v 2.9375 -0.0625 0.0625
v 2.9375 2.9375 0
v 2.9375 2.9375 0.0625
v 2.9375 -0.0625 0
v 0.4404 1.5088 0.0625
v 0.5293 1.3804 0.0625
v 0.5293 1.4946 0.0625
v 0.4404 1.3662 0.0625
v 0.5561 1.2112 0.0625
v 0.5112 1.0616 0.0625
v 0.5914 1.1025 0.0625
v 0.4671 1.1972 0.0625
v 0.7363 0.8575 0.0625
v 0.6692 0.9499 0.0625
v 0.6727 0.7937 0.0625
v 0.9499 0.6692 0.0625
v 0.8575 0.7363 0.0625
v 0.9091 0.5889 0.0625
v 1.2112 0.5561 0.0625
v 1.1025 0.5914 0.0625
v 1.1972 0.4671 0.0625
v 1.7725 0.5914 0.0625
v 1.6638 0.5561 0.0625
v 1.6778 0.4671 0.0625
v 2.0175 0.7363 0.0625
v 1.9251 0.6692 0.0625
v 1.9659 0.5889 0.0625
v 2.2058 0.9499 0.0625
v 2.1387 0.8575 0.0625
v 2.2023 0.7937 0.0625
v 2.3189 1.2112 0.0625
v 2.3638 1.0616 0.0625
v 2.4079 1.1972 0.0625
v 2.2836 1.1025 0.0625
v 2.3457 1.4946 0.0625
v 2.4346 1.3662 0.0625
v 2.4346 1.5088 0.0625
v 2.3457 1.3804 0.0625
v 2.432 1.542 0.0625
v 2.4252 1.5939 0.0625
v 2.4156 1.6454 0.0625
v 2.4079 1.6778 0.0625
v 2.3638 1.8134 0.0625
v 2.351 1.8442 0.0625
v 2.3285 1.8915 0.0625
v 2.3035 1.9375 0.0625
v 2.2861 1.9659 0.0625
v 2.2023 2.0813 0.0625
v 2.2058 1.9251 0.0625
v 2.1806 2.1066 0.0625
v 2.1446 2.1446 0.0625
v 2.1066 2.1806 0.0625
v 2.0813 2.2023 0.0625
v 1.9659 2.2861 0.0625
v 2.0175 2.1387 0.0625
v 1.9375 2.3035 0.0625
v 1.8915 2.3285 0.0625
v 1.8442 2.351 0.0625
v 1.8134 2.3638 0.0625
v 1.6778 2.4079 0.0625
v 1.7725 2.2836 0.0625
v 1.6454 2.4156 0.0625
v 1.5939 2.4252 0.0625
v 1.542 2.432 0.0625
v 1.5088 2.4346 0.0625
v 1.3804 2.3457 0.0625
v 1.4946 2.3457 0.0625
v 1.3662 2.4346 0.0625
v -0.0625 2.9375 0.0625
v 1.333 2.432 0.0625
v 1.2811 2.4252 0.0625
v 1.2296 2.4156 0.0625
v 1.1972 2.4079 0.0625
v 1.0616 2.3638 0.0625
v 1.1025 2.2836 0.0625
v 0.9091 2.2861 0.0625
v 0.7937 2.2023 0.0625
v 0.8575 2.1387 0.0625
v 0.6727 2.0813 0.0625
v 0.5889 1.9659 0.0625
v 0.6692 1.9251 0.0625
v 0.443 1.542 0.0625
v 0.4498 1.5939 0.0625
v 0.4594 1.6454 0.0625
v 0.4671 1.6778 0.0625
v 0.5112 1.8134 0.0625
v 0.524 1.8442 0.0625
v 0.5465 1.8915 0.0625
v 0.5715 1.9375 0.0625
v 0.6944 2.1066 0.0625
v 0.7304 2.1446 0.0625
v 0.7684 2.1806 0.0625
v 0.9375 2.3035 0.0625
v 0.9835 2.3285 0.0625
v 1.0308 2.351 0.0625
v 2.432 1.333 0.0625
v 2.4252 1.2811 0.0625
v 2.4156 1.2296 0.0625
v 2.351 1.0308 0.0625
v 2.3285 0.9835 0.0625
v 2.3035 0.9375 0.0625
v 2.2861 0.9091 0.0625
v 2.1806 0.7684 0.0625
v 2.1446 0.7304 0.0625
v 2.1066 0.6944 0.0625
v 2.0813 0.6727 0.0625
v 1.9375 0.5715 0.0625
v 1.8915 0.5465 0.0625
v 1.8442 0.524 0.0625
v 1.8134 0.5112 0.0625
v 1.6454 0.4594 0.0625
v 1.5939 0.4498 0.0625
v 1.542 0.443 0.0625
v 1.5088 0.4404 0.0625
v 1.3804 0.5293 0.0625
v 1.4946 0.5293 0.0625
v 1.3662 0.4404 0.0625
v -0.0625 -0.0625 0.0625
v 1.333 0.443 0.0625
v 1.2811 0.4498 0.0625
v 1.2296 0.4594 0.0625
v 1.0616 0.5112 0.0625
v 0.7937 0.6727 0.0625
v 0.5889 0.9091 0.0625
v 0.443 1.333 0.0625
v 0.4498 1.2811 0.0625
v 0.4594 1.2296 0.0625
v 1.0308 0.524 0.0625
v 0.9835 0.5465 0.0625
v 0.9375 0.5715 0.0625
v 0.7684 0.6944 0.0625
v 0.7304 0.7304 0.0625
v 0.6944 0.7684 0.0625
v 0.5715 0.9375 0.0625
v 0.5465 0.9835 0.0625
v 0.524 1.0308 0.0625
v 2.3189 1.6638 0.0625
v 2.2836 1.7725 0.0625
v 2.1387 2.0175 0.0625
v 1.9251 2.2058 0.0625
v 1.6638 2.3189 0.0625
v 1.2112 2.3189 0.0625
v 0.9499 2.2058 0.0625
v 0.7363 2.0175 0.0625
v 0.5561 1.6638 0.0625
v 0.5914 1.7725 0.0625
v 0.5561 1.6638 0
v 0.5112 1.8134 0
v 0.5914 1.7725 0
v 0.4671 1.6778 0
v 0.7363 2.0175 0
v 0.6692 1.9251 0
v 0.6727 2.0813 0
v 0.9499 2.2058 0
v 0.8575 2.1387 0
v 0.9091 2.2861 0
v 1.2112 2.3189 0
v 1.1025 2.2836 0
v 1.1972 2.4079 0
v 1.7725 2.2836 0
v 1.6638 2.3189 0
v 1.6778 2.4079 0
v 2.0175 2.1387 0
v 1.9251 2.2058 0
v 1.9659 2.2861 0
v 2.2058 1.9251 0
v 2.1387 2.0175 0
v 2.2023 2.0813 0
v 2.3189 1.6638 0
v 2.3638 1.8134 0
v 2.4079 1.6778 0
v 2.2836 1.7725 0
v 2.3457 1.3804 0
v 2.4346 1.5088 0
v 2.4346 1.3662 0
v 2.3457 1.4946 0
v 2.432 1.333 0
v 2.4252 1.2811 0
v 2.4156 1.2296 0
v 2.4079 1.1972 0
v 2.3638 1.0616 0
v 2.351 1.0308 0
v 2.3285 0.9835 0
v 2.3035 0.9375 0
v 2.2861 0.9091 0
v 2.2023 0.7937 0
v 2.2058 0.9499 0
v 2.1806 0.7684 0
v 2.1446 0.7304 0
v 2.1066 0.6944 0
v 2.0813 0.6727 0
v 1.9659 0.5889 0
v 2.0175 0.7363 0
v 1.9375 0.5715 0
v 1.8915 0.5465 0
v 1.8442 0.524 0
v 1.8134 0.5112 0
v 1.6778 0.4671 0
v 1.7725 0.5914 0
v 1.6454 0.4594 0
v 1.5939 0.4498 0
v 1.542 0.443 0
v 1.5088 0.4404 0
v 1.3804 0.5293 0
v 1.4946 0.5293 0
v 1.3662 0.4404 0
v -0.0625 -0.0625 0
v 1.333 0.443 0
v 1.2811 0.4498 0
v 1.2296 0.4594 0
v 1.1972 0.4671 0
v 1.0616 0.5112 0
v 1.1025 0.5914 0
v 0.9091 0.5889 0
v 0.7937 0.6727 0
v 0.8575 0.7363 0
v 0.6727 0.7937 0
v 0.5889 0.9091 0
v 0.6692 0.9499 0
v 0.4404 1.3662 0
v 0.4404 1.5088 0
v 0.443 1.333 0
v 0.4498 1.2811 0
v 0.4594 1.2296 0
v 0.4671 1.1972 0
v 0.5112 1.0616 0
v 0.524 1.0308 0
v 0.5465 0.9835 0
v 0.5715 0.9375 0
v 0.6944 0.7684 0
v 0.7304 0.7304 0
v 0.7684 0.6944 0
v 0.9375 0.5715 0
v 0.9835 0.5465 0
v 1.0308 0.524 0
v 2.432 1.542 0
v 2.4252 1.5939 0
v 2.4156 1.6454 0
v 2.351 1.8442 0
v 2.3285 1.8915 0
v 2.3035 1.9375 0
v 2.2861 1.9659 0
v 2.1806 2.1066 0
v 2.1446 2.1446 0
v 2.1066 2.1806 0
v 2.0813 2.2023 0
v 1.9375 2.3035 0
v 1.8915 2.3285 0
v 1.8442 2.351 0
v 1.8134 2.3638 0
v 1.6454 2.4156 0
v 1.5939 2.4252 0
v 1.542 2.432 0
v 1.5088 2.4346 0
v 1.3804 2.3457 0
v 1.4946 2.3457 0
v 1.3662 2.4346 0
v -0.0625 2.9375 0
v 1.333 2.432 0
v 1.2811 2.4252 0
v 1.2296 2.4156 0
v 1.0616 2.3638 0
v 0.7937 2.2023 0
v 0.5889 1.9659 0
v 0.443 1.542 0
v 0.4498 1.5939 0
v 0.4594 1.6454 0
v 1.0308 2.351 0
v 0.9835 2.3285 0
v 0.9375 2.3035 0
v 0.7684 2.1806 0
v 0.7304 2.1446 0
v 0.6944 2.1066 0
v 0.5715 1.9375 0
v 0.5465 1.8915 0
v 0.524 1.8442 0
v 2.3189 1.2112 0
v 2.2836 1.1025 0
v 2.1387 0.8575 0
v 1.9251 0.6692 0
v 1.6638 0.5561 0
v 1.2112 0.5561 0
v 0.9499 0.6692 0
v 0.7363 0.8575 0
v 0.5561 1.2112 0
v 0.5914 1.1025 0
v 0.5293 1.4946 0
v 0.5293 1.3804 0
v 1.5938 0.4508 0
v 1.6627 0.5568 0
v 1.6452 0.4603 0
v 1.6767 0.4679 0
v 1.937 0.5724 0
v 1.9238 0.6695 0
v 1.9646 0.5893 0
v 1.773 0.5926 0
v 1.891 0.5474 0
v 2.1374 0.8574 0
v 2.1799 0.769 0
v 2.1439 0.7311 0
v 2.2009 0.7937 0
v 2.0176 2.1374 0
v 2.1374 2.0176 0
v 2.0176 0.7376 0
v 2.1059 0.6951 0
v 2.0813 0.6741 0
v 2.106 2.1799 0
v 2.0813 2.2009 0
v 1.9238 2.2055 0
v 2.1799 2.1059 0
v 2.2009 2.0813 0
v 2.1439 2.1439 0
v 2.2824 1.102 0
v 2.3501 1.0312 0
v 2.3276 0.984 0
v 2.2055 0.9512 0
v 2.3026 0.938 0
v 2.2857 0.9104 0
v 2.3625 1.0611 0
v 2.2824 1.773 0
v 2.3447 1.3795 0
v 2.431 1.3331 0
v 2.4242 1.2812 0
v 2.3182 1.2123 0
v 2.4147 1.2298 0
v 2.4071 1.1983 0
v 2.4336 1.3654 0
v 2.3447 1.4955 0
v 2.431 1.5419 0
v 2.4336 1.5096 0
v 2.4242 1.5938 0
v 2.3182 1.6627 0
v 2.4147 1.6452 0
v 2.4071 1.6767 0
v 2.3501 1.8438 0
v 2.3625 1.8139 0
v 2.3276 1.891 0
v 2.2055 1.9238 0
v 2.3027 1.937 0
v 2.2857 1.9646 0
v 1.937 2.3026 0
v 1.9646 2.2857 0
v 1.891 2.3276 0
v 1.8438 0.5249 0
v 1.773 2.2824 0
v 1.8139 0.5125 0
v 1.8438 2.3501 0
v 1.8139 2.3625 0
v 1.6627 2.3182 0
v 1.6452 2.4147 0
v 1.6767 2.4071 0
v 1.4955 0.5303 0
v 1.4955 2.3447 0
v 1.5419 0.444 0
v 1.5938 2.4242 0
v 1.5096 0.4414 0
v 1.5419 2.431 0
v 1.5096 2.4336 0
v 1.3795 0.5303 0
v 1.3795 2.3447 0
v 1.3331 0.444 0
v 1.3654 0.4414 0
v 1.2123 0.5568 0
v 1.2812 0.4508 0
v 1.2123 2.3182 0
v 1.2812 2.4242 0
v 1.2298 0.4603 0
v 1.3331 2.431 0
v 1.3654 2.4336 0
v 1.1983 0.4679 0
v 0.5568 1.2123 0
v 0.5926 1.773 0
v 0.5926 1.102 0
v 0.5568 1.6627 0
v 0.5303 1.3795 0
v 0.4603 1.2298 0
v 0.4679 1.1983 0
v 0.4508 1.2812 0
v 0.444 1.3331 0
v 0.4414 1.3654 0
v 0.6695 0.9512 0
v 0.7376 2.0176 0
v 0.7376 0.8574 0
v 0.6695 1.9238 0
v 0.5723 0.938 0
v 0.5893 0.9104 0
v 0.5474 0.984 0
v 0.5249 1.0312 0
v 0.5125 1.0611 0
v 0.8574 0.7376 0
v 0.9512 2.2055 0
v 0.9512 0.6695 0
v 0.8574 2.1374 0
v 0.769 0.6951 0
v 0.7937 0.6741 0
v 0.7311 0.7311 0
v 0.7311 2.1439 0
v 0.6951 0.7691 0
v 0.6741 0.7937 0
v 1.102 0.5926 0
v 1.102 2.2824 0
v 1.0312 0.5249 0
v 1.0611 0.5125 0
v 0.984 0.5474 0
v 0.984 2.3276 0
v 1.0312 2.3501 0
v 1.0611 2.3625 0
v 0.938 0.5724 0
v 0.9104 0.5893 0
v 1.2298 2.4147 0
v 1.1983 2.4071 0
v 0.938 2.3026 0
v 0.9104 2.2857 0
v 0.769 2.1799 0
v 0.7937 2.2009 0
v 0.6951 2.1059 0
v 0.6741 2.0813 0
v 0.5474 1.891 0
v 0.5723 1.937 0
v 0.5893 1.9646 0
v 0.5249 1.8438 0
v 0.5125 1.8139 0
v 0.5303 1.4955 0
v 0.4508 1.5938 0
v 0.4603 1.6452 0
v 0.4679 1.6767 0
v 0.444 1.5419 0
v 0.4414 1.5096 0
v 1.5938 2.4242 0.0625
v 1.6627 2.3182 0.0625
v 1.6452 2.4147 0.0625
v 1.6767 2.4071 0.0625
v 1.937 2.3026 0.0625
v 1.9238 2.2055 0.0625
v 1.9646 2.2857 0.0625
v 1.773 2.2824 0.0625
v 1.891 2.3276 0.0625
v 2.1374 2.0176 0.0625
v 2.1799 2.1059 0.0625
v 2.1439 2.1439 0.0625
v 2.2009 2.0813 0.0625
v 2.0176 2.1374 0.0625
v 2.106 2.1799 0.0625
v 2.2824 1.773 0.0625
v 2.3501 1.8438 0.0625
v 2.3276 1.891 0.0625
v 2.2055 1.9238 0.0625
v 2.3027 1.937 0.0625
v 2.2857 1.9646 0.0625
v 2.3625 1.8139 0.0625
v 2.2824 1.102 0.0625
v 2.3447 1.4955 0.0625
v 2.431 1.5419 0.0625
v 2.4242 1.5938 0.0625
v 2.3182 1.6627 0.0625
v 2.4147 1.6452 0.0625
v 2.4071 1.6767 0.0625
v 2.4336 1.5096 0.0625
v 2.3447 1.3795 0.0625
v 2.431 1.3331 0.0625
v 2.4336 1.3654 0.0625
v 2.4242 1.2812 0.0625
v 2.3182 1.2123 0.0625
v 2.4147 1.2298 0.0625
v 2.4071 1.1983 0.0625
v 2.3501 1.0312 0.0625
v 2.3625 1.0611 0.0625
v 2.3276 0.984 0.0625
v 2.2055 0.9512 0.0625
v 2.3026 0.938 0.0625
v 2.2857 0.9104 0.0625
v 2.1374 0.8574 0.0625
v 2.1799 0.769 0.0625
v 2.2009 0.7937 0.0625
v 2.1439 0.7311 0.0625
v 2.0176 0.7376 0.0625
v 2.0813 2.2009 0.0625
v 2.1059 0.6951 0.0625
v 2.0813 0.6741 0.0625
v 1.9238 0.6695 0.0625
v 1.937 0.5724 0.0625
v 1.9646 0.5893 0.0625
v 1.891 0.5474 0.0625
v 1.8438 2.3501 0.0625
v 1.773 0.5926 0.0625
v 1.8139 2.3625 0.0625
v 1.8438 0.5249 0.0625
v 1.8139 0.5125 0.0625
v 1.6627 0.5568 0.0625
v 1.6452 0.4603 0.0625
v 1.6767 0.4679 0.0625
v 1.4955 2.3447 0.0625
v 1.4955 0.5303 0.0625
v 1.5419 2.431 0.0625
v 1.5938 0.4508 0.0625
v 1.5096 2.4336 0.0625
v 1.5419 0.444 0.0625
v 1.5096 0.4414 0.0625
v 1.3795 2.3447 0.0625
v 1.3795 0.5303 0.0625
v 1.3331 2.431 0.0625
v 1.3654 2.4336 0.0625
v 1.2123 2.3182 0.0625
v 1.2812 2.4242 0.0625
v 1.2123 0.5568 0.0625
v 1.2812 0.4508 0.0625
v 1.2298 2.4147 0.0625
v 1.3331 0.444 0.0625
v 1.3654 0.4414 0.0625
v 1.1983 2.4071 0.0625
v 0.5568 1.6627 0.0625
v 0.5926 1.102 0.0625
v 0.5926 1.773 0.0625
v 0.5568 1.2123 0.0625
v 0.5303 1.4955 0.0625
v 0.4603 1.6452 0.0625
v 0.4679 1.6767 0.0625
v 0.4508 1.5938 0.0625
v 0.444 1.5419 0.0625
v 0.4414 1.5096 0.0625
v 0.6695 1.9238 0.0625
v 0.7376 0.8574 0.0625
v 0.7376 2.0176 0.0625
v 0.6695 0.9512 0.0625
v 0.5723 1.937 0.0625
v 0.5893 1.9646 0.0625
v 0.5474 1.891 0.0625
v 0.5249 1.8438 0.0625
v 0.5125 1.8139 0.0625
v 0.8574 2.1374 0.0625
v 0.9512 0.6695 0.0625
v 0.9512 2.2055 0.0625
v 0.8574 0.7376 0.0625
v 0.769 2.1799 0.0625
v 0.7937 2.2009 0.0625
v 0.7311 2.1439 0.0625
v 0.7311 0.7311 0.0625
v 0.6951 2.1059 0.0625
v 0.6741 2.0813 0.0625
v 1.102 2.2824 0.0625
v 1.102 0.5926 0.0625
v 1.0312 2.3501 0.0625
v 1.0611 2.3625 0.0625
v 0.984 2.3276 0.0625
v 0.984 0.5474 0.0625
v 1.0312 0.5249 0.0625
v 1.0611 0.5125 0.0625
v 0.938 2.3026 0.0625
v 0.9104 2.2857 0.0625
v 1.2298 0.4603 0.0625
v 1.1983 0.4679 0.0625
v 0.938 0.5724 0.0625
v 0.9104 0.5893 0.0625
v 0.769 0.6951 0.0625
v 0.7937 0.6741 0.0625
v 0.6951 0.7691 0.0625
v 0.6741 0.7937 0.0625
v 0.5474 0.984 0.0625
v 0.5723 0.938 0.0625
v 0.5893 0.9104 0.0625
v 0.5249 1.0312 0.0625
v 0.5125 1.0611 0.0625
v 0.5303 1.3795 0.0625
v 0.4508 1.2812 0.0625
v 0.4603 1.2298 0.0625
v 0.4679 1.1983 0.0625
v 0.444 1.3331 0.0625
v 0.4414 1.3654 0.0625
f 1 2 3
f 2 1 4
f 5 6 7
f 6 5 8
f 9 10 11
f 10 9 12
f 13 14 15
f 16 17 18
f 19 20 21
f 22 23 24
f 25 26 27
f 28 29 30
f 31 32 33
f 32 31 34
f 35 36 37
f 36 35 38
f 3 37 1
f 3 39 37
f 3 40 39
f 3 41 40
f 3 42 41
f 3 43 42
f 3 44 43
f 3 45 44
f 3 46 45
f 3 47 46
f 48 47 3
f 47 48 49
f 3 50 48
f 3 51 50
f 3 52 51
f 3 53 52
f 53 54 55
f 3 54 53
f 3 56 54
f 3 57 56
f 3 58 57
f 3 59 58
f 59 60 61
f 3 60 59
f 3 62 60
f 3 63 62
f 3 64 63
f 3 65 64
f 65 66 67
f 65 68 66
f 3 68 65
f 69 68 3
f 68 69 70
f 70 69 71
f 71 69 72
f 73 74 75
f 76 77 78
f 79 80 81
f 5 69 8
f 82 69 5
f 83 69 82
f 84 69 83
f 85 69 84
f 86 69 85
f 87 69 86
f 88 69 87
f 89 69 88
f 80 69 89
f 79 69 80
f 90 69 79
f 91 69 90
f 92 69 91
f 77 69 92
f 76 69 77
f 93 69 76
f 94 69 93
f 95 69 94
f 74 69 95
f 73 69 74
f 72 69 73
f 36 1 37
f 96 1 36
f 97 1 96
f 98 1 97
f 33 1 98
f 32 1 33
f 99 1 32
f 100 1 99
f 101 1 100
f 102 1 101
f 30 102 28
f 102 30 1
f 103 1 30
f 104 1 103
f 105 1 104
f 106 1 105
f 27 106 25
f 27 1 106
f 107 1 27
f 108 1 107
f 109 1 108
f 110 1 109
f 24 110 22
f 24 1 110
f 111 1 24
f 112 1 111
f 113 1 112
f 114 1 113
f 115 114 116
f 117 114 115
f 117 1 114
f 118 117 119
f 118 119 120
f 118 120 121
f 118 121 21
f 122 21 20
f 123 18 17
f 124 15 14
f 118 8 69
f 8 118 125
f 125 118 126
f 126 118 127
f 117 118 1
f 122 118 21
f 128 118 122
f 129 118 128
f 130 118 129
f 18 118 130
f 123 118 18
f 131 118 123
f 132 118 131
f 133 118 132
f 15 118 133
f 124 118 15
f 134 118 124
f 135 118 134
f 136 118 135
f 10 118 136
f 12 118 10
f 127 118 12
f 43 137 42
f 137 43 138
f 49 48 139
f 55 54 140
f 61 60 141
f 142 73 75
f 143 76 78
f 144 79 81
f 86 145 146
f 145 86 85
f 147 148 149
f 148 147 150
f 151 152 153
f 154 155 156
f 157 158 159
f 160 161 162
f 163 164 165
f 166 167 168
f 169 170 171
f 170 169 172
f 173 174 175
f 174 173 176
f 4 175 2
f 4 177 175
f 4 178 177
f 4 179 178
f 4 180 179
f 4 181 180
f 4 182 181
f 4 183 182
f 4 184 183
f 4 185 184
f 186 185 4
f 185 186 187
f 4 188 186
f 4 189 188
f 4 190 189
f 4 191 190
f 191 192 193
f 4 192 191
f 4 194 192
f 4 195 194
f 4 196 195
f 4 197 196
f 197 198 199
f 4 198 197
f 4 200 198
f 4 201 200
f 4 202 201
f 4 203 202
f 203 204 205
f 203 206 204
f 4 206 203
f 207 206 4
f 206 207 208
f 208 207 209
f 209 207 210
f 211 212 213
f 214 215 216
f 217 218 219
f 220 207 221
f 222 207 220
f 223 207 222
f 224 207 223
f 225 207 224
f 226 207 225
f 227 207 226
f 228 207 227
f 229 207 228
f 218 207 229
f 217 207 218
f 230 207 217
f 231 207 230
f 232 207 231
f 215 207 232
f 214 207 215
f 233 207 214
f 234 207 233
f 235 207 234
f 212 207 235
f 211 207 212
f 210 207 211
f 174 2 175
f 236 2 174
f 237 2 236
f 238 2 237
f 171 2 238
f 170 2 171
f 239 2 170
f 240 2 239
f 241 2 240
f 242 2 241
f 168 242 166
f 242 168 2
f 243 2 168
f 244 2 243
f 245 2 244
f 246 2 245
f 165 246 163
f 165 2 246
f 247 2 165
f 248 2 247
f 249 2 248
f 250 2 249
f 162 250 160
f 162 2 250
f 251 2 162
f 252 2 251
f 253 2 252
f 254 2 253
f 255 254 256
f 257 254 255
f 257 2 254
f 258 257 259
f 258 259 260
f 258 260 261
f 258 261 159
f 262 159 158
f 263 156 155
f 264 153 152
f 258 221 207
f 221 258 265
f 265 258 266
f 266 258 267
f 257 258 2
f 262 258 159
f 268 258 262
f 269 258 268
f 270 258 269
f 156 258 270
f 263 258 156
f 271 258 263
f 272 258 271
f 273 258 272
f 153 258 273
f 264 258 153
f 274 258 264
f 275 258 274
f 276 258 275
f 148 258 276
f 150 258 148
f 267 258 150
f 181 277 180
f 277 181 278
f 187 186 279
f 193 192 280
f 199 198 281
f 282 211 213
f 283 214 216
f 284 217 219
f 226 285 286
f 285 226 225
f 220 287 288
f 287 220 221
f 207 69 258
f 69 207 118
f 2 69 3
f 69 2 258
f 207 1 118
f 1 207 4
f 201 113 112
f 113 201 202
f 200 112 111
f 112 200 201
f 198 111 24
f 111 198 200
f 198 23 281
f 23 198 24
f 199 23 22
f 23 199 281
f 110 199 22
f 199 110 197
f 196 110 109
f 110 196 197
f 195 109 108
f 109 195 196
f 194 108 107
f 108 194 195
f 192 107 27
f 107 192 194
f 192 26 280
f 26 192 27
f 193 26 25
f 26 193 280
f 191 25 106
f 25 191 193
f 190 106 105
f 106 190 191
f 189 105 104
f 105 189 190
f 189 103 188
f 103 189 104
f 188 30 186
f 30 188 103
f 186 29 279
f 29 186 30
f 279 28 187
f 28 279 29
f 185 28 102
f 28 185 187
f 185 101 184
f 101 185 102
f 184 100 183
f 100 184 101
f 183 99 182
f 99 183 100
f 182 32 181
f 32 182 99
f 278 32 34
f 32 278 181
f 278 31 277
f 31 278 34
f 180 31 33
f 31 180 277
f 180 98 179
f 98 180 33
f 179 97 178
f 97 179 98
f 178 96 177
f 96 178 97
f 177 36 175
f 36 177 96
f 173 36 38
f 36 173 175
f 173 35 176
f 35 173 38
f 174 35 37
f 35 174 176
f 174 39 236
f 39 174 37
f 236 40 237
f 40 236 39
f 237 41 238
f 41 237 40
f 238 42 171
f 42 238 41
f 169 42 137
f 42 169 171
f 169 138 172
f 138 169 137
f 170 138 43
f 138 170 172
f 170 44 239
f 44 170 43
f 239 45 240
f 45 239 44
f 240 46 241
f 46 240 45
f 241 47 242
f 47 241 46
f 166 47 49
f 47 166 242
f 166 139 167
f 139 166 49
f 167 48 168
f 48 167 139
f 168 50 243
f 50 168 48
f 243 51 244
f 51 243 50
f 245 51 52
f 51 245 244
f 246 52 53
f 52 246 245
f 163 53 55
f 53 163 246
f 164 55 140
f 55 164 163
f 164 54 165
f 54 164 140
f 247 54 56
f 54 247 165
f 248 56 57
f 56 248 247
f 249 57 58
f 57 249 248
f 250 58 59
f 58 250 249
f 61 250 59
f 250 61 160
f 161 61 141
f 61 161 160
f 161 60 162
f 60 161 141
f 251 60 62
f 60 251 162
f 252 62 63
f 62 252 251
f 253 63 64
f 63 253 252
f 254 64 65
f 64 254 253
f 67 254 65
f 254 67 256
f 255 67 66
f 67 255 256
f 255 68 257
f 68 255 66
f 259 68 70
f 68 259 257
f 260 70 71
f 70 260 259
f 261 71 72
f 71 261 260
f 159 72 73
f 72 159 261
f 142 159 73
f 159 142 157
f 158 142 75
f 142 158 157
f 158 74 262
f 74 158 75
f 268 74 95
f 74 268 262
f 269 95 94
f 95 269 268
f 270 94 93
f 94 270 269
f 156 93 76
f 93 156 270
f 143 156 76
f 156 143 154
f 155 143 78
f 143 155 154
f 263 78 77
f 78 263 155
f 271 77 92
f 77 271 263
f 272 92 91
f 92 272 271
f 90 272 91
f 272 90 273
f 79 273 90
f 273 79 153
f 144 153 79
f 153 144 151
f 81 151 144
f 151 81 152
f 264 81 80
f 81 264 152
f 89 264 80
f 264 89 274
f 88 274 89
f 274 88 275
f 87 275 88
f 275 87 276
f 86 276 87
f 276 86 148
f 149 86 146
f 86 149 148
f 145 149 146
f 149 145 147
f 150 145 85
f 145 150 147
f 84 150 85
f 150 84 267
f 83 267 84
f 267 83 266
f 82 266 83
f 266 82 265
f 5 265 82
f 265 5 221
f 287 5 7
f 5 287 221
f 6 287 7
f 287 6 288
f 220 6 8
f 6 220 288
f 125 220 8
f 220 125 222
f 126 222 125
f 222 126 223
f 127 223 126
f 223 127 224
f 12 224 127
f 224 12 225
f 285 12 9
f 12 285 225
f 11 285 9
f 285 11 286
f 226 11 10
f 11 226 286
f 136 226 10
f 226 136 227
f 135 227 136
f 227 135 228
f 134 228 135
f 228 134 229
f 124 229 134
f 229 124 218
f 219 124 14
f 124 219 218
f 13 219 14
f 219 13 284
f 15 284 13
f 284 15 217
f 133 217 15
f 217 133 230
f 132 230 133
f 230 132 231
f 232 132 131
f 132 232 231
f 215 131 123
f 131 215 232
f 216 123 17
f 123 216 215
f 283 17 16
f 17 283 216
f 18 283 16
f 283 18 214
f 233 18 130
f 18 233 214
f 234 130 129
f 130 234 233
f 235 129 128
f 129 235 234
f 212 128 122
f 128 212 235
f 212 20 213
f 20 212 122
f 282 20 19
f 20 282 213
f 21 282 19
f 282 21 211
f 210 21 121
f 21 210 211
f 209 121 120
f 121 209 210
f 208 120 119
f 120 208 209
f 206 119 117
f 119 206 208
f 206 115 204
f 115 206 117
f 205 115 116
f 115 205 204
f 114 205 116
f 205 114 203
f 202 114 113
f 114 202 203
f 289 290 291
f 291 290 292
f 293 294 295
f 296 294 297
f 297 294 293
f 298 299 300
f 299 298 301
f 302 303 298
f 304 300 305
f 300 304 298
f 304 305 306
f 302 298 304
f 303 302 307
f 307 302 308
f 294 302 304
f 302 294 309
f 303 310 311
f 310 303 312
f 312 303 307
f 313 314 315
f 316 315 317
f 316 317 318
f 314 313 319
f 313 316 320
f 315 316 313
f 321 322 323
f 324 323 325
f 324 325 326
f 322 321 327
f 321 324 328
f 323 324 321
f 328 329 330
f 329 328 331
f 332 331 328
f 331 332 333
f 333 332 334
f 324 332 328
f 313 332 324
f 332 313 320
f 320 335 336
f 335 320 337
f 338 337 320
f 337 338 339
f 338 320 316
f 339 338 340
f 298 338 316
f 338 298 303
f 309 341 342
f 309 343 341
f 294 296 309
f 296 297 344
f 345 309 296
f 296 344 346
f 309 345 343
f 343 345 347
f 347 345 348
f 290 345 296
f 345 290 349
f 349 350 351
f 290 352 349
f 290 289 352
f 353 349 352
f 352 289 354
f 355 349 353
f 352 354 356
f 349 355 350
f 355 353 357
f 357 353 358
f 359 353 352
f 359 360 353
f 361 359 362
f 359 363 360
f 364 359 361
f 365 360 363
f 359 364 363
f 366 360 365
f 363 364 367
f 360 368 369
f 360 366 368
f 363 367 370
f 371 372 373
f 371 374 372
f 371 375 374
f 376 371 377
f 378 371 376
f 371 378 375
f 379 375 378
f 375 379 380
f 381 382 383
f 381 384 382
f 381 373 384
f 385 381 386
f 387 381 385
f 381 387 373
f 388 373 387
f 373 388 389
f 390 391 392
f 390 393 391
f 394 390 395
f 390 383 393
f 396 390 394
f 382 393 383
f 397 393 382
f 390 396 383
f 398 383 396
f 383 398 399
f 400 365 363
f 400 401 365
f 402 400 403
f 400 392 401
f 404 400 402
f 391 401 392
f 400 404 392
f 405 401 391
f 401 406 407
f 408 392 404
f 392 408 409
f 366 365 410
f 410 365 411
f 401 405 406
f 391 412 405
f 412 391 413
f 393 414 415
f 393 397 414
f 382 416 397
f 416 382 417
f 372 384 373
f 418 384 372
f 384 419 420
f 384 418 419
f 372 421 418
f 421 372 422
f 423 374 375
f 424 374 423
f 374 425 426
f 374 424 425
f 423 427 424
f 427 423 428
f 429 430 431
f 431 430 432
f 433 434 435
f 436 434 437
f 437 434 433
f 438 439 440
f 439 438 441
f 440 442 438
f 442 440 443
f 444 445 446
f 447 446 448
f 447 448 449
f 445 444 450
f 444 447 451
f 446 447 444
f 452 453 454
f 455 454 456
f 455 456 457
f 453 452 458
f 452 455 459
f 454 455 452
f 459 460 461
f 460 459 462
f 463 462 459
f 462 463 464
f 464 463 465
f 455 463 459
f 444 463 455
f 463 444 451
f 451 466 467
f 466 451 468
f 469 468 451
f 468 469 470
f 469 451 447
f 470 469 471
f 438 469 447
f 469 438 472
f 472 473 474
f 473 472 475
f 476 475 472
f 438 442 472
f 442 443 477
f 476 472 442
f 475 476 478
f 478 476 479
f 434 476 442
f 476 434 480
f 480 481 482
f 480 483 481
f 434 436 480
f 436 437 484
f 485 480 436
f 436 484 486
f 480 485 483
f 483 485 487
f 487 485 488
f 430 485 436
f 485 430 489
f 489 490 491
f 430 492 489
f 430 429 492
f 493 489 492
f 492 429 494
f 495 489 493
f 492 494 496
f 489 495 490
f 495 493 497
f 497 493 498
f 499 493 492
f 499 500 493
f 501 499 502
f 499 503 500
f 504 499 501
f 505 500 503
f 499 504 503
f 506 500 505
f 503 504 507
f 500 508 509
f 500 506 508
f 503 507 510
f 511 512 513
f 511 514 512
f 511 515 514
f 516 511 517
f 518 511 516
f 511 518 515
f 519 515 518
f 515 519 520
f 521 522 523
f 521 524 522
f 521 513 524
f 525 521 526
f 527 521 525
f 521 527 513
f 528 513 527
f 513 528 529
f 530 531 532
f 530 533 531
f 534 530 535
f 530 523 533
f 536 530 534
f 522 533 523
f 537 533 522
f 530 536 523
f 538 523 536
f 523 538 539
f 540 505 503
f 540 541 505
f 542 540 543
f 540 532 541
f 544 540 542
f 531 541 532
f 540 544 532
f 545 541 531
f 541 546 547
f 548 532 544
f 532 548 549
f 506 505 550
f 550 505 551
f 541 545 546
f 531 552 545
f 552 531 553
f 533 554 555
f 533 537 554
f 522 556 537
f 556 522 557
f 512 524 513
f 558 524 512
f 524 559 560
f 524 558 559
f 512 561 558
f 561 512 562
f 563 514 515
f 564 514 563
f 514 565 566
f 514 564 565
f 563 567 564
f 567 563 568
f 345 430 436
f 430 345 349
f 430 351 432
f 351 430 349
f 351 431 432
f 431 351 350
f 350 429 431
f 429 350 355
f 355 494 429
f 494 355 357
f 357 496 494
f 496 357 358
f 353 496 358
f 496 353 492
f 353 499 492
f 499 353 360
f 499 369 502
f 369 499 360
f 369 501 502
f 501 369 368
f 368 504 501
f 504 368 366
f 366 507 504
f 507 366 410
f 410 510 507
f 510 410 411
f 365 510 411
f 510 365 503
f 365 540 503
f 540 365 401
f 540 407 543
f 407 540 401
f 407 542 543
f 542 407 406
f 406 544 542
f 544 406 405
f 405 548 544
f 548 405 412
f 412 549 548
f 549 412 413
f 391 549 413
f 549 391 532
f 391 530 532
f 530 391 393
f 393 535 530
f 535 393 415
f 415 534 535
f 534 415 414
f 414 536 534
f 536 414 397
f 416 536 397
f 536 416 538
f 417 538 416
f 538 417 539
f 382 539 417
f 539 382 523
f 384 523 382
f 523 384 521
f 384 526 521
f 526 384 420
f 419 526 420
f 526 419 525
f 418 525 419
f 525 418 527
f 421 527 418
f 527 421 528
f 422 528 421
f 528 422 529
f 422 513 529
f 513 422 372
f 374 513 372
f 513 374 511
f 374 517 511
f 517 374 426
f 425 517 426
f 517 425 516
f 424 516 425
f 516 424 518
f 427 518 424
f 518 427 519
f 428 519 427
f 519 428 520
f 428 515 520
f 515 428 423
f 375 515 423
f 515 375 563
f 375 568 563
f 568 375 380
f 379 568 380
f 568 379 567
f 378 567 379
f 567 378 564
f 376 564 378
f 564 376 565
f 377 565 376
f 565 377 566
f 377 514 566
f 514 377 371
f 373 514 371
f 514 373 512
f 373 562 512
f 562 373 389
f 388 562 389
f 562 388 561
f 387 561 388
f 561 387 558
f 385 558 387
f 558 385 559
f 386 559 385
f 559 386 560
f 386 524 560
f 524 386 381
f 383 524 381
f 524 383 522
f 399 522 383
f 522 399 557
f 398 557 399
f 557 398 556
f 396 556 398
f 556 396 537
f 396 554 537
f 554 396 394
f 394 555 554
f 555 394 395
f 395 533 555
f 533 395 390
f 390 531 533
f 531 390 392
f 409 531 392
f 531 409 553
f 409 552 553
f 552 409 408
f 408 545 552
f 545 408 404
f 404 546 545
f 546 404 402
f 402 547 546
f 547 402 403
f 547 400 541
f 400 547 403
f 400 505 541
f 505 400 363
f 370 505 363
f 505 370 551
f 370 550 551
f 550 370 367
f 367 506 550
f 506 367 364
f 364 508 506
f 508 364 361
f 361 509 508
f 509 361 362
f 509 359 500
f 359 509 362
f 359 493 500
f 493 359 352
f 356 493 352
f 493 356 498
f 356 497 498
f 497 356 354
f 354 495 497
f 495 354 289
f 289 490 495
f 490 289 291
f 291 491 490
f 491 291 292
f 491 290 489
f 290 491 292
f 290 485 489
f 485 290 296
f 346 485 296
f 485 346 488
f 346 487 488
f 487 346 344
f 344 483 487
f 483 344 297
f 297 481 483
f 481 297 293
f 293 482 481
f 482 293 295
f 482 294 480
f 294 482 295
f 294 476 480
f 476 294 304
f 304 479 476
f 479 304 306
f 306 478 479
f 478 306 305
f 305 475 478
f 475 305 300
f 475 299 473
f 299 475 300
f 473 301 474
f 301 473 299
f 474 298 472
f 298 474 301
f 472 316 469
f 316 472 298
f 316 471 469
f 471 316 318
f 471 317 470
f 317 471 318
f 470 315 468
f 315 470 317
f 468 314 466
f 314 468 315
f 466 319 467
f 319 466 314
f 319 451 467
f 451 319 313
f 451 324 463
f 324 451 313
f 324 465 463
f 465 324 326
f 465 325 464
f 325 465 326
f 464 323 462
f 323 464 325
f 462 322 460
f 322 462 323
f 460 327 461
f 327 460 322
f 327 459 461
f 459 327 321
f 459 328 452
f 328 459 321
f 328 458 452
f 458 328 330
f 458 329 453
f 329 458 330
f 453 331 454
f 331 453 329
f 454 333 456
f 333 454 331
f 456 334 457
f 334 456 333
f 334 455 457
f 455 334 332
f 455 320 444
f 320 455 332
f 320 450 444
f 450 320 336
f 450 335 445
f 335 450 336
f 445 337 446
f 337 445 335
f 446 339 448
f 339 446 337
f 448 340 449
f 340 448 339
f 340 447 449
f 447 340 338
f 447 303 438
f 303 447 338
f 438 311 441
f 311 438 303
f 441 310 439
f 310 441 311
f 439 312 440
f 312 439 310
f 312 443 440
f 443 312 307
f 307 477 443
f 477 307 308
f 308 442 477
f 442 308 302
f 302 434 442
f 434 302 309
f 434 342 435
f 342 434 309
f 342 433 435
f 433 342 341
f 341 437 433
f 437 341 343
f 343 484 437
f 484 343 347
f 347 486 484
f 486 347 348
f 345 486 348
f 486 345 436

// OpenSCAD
// file: modules.scad
// modules.scad — shared tile-building blocks: plate, rivets, edge ID marks,
// and the common plate/hole dimensional constants used by every tile.
// Units: inches
//
// Usage — must be `include`, not `use`, and the include line must come
// before any code in the caller that references plate_w/plate_d/plate_h/
// frame_w/hole_d/hole_r: a variable defined only inside an included file is
// invisible to code positioned before the include statement.
//   include <modules.scad>
//   plate(["red", undef, "blue", undef, undef, "green"]);
//
// plate(colors) is the main entry point: it builds the complete base tile in
// one call — the frame with edge ID marks, the darkgray plate, and the
// lightgray rivet ring (40 rivets, 10 per side, corners shared). colors is the
// same 6-slot frame_with_id() array described below.
//
// frame_with_id() colors are applied left-to-right (−x to +x), repeated
// identically on all four edges. Bottom and right edges read the array in
// reverse (slot 5-i) so the pattern stays consistent when the tile is flipped.
// Any position left as undef or omitted defaults to black. 6 regions span the
// straight run of each edge (corners always stay solid black). A thin black
// layer covers the marks on the top face; marks are visible from the edge.

plate_w = 2 + 7/8;
plate_d = 2 + 7/8;
plate_h = 1/16;
frame_w = 1/16;
hole_d  = 3/32;
hole_r  = hole_d / 2;

module rivet_holes() {
    spacing_x = plate_w / 10;
    spacing_y = plate_d / 10;
    inset_x   = spacing_x / 2;
    inset_y   = spacing_y / 2;
    for (i = [0:9]) translate([inset_x + i * spacing_x, inset_y,           -1]) cylinder(h = plate_h + 2, r = hole_r, $fn = 20);
    for (i = [0:9]) translate([inset_x + i * spacing_x, plate_d - inset_y, -1]) cylinder(h = plate_h + 2, r = hole_r, $fn = 20);
    for (i = [0:9]) translate([inset_x,           inset_y + i * spacing_y, -1]) cylinder(h = plate_h + 2, r = hole_r, $fn = 20);
    for (i = [0:9]) translate([plate_w - inset_x, inset_y + i * spacing_y, -1]) cylinder(h = plate_h + 2, r = hole_r, $fn = 20);
}

module rivets() {
    spacing_x = plate_w / 10;
    spacing_y = plate_d / 10;
    inset_x   = spacing_x / 2;
    inset_y   = spacing_y / 2;
    color("lightgray") {
        for (i = [0:9]) translate([inset_x + i * spacing_x, inset_y,           0]) cylinder(h = plate_h, r = hole_r, $fn = 20);
        for (i = [0:9]) translate([inset_x + i * spacing_x, plate_d - inset_y, 0]) cylinder(h = plate_h, r = hole_r, $fn = 20);
        for (i = [0:9]) translate([inset_x,           inset_y + i * spacing_y, 0]) cylinder(h = plate_h, r = hole_r, $fn = 20);
        for (i = [0:9]) translate([plate_w - inset_x, inset_y + i * spacing_y, 0]) cylinder(h = plate_h, r = hole_r, $fn = 20);
    }
}

module frame_with_id(colors = []) {
    id_cover = plate_h / 8;
    region_w = plate_w / 6;
    region_d = plate_d / 6;
    mark_h   = plate_h - id_cover;

    color("black")
    difference() {
        translate([-frame_w, -frame_w, 0])
            cube([plate_w + 2 * frame_w, plate_d + 2 * frame_w, plate_h]);
        translate([0, 0, -0.001])
            cube([plate_w, plate_d, plate_h + 0.002]);
        // top/bottom/left/right straight runs only — corners stay solid black
        translate([0, plate_d - 0.001, -0.001])
            cube([plate_w, frame_w + 0.002, plate_h + 0.002]);
        translate([0, -frame_w - 0.001, -0.001])
            cube([plate_w, frame_w + 0.002, plate_h + 0.002]);
        translate([-frame_w - 0.001, 0, -0.001])
            cube([frame_w + 0.002, plate_d, plate_h + 0.002]);
        translate([plate_w - 0.001, 0, -0.001])
            cube([frame_w + 0.002, plate_d, plate_h + 0.002]);
    }

    for (i = [0:5]) {
        c     = (colors[i] != undef) ? colors[i] : "black";

        // top edge
        color(c) translate([i * region_w, plate_d, 0]) cube([region_w, frame_w, mark_h]);
        color("black") translate([i * region_w, plate_d, mark_h]) cube([region_w, frame_w, id_cover]);

        // bottom edge (reversed)
        color(c) translate([(5-i) * region_w, -frame_w, 0]) cube([region_w, frame_w, mark_h]);
        color("black") translate([(5-i) * region_w, -frame_w, mark_h]) cube([region_w, frame_w, id_cover]);

        // left edge
        color(c) translate([-frame_w, i * region_d, 0]) cube([frame_w, region_d, mark_h]);
        color("black") translate([-frame_w, i * region_d, mark_h]) cube([frame_w, region_d, id_cover]);

        // right edge (reversed)
        color(c) translate([plate_w, (5-i) * region_d, 0]) cube([frame_w, region_d, mark_h]);
        color("black") translate([plate_w, (5-i) * region_d, mark_h]) cube([frame_w, region_d, id_cover]);
    }
}

module plate(colors = []) {
    frame_with_id(colors);
    union() {
        difference() {
            color("darkgray") cube([plate_w, plate_d, plate_h]);
            rivet_holes();
        }
        rivets();
    }
}
// main file
// element120-C.scad
// Vortex Portal (Orange) — orange ring with inner fill, dashes, and upward arrow;
// letter "C" marks this variant.
// Units: inches

include <modules.scad>

cx = plate_w / 2;
cy = plate_d / 2;

// Orange ring — same radii as the element100/110 gear ring
ring_r_out = 1.18;
ring_r_in  = 1.00;

// Inward-pointing teeth cut into the ring's inner edge (same technique as element110-2)
ring_n        = 20;
ring_tooth_hw = 4.5;
ring_tooth_f  = 0.80;
ring_tooth_d  = 0.09;   // tooth depth, same as the gear tiles' tooth depth

// Orange dashed arc inside the ring, lower arc (portal intake indicator)
dash_r     = 0.73;
dash_count = 8;
dash_a1    = 205;
dash_a2    = 335;
dash_w     = 0.074;
dash_len   = 0.140;

// Orange upward arrow — bottom unchanged, tip restored to original position
arr_stem_w  = 0.40;
arr_stem_y1 = cy - 0.44;
arr_stem_y2 = cy + 0.20;
arr_head_w  = 0.90;
arr_head_h  = 0.38;

// ── Standard modules ─────────────────────────────────────────────────────────

// ── Ring 2D helpers ───────────────────────────────────────────────────────────

module ring_tooth_2d() {
    r_outer = ring_r_in + ring_tooth_d;
    r_inner = ring_r_in - ring_tooth_d;
    polygon([
        [r_outer * cos(-ring_tooth_hw),               r_outer * sin(-ring_tooth_hw)],
        [r_inner * cos(-ring_tooth_hw * ring_tooth_f), r_inner * sin(-ring_tooth_hw * ring_tooth_f)],
        [r_inner * cos( ring_tooth_hw * ring_tooth_f), r_inner * sin( ring_tooth_hw * ring_tooth_f)],
        [r_outer * cos( ring_tooth_hw),               r_outer * sin( ring_tooth_hw)],
    ]);
}

module ring_2d() {
    circle(r = ring_r_out, $fn = 120);
}

module ring_bore_2d() {
    pitch = 360 / ring_n;
    difference() {
        circle(r = ring_r_in, $fn = 120);
        for (i = [0:ring_n - 1]) rotate([0, 0, i * pitch]) ring_tooth_2d();
    }
}

// ── Ring hole & ring ─────────────────────────────────────────────────────────

module ring_holes() {
    translate([cx, cy, -1])
    linear_extrude(plate_h + 2)
    difference() {
        ring_2d();
        ring_bore_2d();
    }
}

module white_ring() {
    color("orange")
    translate([cx, cy, 0])
    linear_extrude(plate_h)
    difference() {
        ring_2d();
        ring_bore_2d();
    }
}

// ── Inner fill hole & inner fill ─────────────────────────────────────────────

module inner_fill_holes() {
    translate([cx, cy, -1])
    linear_extrude(plate_h + 2)
    ring_bore_2d();
}

module inner_fill() {
    color("lightgray")
    translate([cx, cy, 0])
    linear_extrude(plate_h)
    offset(delta = -0.001) ring_bore_2d();
}

// ── Dash holes & dashes ───────────────────────────────────────────────────────

module dash_holes() {
    span = dash_a2 - dash_a1;
    for (i = [0 : dash_count - 1]) {
        angle = dash_a1 + span * i / (dash_count - 1);
        dx = cx + dash_r * cos(angle);
        dy = cy + dash_r * sin(angle);
        translate([dx, dy, -1])
        rotate([0, 0, angle + 90])
        linear_extrude(plate_h + 2)
        square([dash_w, dash_len], center = true);
    }
}

module white_dashes() {
    span = dash_a2 - dash_a1;
    color("orange") {
        for (i = [0 : dash_count - 1]) {
            angle = dash_a1 + span * i / (dash_count - 1);
            dx = cx + dash_r * cos(angle);
            dy = cy + dash_r * sin(angle);
            translate([dx, dy, 0])
            rotate([0, 0, angle + 90])
            linear_extrude(plate_h)
            square([dash_w, dash_len], center = true);
        }
    }
}

// ── Arrow hole & arrow ────────────────────────────────────────────────────────

module arrow_holes() {
    translate([0, 0, -1])
    linear_extrude(plate_h + 2)
    union() {
        translate([cx - arr_stem_w / 2, arr_stem_y1])
            square([arr_stem_w, arr_stem_y2 - arr_stem_y1]);
        translate([cx, arr_stem_y2])
            polygon([
                [-arr_head_w / 2, 0],
                [ arr_head_w / 2, 0],
                [0, arr_head_h]
            ]);
    }
}

module white_arrow() {
    color("orange")
    linear_extrude(plate_h)
    union() {
        translate([cx - arr_stem_w / 2, arr_stem_y1])
            square([arr_stem_w, arr_stem_y2 - arr_stem_y1]);
        translate([cx, arr_stem_y2])
            polygon([
                [-arr_head_w / 2, 0],
                [ arr_head_w / 2, 0],
                [0, arr_head_h]
            ]);
    }
}

// ── Label hole → label ────────────────────────────────────────────────────────

module label_holes() {
    translate([cx, cy, -1])
    linear_extrude(plate_h + 2)
    text("C", size = .3, halign = "center", valign = "center",
         font = "Liberation Sans:style=Bold");
}

module label() {
    color("white")
    translate([cx, cy, 0])
    linear_extrude(plate_h)
    text("C", size = .3, halign = "center", valign = "center",
         font = "Liberation Sans:style=Bold");
}

// ── Assembly ──────────────────────────────────────────────────────────────────
// Each level: difference() cuts the holes INTO the running assembly,
//             union() then adds the feature that fills those holes.
// Innermost = first step; outermost = last step.

union() {                                           // step 4: add label
    difference() {
        union() {                                   // step 3: add dashes & arrow
            difference() {
                union() {                           // step 2: add inner fill
                    difference() {
                        union() {                   // step 1: add ring
                            difference() {
                                plate(["orange", "orange", undef, "orange", "orange", "orange"]);   // step 0: plate (frame + rivets)
                                ring_holes();               // cut ring holes
                            }
                            white_ring();                   // fill with ring
                        }
                        inner_fill_holes();                 // cut inner fill holes
                    }
                    inner_fill();                           // fill with inner fill
                }
                dash_holes();                               // cut dash holes
                arrow_holes();                               // cut arrow holes
            }
            white_dashes();                                 // fill with dashes
            white_arrow();                                  // fill with arrow
        }
        label_holes();                                      // cut label hole
    }
    label();                                                // fill with label
}
